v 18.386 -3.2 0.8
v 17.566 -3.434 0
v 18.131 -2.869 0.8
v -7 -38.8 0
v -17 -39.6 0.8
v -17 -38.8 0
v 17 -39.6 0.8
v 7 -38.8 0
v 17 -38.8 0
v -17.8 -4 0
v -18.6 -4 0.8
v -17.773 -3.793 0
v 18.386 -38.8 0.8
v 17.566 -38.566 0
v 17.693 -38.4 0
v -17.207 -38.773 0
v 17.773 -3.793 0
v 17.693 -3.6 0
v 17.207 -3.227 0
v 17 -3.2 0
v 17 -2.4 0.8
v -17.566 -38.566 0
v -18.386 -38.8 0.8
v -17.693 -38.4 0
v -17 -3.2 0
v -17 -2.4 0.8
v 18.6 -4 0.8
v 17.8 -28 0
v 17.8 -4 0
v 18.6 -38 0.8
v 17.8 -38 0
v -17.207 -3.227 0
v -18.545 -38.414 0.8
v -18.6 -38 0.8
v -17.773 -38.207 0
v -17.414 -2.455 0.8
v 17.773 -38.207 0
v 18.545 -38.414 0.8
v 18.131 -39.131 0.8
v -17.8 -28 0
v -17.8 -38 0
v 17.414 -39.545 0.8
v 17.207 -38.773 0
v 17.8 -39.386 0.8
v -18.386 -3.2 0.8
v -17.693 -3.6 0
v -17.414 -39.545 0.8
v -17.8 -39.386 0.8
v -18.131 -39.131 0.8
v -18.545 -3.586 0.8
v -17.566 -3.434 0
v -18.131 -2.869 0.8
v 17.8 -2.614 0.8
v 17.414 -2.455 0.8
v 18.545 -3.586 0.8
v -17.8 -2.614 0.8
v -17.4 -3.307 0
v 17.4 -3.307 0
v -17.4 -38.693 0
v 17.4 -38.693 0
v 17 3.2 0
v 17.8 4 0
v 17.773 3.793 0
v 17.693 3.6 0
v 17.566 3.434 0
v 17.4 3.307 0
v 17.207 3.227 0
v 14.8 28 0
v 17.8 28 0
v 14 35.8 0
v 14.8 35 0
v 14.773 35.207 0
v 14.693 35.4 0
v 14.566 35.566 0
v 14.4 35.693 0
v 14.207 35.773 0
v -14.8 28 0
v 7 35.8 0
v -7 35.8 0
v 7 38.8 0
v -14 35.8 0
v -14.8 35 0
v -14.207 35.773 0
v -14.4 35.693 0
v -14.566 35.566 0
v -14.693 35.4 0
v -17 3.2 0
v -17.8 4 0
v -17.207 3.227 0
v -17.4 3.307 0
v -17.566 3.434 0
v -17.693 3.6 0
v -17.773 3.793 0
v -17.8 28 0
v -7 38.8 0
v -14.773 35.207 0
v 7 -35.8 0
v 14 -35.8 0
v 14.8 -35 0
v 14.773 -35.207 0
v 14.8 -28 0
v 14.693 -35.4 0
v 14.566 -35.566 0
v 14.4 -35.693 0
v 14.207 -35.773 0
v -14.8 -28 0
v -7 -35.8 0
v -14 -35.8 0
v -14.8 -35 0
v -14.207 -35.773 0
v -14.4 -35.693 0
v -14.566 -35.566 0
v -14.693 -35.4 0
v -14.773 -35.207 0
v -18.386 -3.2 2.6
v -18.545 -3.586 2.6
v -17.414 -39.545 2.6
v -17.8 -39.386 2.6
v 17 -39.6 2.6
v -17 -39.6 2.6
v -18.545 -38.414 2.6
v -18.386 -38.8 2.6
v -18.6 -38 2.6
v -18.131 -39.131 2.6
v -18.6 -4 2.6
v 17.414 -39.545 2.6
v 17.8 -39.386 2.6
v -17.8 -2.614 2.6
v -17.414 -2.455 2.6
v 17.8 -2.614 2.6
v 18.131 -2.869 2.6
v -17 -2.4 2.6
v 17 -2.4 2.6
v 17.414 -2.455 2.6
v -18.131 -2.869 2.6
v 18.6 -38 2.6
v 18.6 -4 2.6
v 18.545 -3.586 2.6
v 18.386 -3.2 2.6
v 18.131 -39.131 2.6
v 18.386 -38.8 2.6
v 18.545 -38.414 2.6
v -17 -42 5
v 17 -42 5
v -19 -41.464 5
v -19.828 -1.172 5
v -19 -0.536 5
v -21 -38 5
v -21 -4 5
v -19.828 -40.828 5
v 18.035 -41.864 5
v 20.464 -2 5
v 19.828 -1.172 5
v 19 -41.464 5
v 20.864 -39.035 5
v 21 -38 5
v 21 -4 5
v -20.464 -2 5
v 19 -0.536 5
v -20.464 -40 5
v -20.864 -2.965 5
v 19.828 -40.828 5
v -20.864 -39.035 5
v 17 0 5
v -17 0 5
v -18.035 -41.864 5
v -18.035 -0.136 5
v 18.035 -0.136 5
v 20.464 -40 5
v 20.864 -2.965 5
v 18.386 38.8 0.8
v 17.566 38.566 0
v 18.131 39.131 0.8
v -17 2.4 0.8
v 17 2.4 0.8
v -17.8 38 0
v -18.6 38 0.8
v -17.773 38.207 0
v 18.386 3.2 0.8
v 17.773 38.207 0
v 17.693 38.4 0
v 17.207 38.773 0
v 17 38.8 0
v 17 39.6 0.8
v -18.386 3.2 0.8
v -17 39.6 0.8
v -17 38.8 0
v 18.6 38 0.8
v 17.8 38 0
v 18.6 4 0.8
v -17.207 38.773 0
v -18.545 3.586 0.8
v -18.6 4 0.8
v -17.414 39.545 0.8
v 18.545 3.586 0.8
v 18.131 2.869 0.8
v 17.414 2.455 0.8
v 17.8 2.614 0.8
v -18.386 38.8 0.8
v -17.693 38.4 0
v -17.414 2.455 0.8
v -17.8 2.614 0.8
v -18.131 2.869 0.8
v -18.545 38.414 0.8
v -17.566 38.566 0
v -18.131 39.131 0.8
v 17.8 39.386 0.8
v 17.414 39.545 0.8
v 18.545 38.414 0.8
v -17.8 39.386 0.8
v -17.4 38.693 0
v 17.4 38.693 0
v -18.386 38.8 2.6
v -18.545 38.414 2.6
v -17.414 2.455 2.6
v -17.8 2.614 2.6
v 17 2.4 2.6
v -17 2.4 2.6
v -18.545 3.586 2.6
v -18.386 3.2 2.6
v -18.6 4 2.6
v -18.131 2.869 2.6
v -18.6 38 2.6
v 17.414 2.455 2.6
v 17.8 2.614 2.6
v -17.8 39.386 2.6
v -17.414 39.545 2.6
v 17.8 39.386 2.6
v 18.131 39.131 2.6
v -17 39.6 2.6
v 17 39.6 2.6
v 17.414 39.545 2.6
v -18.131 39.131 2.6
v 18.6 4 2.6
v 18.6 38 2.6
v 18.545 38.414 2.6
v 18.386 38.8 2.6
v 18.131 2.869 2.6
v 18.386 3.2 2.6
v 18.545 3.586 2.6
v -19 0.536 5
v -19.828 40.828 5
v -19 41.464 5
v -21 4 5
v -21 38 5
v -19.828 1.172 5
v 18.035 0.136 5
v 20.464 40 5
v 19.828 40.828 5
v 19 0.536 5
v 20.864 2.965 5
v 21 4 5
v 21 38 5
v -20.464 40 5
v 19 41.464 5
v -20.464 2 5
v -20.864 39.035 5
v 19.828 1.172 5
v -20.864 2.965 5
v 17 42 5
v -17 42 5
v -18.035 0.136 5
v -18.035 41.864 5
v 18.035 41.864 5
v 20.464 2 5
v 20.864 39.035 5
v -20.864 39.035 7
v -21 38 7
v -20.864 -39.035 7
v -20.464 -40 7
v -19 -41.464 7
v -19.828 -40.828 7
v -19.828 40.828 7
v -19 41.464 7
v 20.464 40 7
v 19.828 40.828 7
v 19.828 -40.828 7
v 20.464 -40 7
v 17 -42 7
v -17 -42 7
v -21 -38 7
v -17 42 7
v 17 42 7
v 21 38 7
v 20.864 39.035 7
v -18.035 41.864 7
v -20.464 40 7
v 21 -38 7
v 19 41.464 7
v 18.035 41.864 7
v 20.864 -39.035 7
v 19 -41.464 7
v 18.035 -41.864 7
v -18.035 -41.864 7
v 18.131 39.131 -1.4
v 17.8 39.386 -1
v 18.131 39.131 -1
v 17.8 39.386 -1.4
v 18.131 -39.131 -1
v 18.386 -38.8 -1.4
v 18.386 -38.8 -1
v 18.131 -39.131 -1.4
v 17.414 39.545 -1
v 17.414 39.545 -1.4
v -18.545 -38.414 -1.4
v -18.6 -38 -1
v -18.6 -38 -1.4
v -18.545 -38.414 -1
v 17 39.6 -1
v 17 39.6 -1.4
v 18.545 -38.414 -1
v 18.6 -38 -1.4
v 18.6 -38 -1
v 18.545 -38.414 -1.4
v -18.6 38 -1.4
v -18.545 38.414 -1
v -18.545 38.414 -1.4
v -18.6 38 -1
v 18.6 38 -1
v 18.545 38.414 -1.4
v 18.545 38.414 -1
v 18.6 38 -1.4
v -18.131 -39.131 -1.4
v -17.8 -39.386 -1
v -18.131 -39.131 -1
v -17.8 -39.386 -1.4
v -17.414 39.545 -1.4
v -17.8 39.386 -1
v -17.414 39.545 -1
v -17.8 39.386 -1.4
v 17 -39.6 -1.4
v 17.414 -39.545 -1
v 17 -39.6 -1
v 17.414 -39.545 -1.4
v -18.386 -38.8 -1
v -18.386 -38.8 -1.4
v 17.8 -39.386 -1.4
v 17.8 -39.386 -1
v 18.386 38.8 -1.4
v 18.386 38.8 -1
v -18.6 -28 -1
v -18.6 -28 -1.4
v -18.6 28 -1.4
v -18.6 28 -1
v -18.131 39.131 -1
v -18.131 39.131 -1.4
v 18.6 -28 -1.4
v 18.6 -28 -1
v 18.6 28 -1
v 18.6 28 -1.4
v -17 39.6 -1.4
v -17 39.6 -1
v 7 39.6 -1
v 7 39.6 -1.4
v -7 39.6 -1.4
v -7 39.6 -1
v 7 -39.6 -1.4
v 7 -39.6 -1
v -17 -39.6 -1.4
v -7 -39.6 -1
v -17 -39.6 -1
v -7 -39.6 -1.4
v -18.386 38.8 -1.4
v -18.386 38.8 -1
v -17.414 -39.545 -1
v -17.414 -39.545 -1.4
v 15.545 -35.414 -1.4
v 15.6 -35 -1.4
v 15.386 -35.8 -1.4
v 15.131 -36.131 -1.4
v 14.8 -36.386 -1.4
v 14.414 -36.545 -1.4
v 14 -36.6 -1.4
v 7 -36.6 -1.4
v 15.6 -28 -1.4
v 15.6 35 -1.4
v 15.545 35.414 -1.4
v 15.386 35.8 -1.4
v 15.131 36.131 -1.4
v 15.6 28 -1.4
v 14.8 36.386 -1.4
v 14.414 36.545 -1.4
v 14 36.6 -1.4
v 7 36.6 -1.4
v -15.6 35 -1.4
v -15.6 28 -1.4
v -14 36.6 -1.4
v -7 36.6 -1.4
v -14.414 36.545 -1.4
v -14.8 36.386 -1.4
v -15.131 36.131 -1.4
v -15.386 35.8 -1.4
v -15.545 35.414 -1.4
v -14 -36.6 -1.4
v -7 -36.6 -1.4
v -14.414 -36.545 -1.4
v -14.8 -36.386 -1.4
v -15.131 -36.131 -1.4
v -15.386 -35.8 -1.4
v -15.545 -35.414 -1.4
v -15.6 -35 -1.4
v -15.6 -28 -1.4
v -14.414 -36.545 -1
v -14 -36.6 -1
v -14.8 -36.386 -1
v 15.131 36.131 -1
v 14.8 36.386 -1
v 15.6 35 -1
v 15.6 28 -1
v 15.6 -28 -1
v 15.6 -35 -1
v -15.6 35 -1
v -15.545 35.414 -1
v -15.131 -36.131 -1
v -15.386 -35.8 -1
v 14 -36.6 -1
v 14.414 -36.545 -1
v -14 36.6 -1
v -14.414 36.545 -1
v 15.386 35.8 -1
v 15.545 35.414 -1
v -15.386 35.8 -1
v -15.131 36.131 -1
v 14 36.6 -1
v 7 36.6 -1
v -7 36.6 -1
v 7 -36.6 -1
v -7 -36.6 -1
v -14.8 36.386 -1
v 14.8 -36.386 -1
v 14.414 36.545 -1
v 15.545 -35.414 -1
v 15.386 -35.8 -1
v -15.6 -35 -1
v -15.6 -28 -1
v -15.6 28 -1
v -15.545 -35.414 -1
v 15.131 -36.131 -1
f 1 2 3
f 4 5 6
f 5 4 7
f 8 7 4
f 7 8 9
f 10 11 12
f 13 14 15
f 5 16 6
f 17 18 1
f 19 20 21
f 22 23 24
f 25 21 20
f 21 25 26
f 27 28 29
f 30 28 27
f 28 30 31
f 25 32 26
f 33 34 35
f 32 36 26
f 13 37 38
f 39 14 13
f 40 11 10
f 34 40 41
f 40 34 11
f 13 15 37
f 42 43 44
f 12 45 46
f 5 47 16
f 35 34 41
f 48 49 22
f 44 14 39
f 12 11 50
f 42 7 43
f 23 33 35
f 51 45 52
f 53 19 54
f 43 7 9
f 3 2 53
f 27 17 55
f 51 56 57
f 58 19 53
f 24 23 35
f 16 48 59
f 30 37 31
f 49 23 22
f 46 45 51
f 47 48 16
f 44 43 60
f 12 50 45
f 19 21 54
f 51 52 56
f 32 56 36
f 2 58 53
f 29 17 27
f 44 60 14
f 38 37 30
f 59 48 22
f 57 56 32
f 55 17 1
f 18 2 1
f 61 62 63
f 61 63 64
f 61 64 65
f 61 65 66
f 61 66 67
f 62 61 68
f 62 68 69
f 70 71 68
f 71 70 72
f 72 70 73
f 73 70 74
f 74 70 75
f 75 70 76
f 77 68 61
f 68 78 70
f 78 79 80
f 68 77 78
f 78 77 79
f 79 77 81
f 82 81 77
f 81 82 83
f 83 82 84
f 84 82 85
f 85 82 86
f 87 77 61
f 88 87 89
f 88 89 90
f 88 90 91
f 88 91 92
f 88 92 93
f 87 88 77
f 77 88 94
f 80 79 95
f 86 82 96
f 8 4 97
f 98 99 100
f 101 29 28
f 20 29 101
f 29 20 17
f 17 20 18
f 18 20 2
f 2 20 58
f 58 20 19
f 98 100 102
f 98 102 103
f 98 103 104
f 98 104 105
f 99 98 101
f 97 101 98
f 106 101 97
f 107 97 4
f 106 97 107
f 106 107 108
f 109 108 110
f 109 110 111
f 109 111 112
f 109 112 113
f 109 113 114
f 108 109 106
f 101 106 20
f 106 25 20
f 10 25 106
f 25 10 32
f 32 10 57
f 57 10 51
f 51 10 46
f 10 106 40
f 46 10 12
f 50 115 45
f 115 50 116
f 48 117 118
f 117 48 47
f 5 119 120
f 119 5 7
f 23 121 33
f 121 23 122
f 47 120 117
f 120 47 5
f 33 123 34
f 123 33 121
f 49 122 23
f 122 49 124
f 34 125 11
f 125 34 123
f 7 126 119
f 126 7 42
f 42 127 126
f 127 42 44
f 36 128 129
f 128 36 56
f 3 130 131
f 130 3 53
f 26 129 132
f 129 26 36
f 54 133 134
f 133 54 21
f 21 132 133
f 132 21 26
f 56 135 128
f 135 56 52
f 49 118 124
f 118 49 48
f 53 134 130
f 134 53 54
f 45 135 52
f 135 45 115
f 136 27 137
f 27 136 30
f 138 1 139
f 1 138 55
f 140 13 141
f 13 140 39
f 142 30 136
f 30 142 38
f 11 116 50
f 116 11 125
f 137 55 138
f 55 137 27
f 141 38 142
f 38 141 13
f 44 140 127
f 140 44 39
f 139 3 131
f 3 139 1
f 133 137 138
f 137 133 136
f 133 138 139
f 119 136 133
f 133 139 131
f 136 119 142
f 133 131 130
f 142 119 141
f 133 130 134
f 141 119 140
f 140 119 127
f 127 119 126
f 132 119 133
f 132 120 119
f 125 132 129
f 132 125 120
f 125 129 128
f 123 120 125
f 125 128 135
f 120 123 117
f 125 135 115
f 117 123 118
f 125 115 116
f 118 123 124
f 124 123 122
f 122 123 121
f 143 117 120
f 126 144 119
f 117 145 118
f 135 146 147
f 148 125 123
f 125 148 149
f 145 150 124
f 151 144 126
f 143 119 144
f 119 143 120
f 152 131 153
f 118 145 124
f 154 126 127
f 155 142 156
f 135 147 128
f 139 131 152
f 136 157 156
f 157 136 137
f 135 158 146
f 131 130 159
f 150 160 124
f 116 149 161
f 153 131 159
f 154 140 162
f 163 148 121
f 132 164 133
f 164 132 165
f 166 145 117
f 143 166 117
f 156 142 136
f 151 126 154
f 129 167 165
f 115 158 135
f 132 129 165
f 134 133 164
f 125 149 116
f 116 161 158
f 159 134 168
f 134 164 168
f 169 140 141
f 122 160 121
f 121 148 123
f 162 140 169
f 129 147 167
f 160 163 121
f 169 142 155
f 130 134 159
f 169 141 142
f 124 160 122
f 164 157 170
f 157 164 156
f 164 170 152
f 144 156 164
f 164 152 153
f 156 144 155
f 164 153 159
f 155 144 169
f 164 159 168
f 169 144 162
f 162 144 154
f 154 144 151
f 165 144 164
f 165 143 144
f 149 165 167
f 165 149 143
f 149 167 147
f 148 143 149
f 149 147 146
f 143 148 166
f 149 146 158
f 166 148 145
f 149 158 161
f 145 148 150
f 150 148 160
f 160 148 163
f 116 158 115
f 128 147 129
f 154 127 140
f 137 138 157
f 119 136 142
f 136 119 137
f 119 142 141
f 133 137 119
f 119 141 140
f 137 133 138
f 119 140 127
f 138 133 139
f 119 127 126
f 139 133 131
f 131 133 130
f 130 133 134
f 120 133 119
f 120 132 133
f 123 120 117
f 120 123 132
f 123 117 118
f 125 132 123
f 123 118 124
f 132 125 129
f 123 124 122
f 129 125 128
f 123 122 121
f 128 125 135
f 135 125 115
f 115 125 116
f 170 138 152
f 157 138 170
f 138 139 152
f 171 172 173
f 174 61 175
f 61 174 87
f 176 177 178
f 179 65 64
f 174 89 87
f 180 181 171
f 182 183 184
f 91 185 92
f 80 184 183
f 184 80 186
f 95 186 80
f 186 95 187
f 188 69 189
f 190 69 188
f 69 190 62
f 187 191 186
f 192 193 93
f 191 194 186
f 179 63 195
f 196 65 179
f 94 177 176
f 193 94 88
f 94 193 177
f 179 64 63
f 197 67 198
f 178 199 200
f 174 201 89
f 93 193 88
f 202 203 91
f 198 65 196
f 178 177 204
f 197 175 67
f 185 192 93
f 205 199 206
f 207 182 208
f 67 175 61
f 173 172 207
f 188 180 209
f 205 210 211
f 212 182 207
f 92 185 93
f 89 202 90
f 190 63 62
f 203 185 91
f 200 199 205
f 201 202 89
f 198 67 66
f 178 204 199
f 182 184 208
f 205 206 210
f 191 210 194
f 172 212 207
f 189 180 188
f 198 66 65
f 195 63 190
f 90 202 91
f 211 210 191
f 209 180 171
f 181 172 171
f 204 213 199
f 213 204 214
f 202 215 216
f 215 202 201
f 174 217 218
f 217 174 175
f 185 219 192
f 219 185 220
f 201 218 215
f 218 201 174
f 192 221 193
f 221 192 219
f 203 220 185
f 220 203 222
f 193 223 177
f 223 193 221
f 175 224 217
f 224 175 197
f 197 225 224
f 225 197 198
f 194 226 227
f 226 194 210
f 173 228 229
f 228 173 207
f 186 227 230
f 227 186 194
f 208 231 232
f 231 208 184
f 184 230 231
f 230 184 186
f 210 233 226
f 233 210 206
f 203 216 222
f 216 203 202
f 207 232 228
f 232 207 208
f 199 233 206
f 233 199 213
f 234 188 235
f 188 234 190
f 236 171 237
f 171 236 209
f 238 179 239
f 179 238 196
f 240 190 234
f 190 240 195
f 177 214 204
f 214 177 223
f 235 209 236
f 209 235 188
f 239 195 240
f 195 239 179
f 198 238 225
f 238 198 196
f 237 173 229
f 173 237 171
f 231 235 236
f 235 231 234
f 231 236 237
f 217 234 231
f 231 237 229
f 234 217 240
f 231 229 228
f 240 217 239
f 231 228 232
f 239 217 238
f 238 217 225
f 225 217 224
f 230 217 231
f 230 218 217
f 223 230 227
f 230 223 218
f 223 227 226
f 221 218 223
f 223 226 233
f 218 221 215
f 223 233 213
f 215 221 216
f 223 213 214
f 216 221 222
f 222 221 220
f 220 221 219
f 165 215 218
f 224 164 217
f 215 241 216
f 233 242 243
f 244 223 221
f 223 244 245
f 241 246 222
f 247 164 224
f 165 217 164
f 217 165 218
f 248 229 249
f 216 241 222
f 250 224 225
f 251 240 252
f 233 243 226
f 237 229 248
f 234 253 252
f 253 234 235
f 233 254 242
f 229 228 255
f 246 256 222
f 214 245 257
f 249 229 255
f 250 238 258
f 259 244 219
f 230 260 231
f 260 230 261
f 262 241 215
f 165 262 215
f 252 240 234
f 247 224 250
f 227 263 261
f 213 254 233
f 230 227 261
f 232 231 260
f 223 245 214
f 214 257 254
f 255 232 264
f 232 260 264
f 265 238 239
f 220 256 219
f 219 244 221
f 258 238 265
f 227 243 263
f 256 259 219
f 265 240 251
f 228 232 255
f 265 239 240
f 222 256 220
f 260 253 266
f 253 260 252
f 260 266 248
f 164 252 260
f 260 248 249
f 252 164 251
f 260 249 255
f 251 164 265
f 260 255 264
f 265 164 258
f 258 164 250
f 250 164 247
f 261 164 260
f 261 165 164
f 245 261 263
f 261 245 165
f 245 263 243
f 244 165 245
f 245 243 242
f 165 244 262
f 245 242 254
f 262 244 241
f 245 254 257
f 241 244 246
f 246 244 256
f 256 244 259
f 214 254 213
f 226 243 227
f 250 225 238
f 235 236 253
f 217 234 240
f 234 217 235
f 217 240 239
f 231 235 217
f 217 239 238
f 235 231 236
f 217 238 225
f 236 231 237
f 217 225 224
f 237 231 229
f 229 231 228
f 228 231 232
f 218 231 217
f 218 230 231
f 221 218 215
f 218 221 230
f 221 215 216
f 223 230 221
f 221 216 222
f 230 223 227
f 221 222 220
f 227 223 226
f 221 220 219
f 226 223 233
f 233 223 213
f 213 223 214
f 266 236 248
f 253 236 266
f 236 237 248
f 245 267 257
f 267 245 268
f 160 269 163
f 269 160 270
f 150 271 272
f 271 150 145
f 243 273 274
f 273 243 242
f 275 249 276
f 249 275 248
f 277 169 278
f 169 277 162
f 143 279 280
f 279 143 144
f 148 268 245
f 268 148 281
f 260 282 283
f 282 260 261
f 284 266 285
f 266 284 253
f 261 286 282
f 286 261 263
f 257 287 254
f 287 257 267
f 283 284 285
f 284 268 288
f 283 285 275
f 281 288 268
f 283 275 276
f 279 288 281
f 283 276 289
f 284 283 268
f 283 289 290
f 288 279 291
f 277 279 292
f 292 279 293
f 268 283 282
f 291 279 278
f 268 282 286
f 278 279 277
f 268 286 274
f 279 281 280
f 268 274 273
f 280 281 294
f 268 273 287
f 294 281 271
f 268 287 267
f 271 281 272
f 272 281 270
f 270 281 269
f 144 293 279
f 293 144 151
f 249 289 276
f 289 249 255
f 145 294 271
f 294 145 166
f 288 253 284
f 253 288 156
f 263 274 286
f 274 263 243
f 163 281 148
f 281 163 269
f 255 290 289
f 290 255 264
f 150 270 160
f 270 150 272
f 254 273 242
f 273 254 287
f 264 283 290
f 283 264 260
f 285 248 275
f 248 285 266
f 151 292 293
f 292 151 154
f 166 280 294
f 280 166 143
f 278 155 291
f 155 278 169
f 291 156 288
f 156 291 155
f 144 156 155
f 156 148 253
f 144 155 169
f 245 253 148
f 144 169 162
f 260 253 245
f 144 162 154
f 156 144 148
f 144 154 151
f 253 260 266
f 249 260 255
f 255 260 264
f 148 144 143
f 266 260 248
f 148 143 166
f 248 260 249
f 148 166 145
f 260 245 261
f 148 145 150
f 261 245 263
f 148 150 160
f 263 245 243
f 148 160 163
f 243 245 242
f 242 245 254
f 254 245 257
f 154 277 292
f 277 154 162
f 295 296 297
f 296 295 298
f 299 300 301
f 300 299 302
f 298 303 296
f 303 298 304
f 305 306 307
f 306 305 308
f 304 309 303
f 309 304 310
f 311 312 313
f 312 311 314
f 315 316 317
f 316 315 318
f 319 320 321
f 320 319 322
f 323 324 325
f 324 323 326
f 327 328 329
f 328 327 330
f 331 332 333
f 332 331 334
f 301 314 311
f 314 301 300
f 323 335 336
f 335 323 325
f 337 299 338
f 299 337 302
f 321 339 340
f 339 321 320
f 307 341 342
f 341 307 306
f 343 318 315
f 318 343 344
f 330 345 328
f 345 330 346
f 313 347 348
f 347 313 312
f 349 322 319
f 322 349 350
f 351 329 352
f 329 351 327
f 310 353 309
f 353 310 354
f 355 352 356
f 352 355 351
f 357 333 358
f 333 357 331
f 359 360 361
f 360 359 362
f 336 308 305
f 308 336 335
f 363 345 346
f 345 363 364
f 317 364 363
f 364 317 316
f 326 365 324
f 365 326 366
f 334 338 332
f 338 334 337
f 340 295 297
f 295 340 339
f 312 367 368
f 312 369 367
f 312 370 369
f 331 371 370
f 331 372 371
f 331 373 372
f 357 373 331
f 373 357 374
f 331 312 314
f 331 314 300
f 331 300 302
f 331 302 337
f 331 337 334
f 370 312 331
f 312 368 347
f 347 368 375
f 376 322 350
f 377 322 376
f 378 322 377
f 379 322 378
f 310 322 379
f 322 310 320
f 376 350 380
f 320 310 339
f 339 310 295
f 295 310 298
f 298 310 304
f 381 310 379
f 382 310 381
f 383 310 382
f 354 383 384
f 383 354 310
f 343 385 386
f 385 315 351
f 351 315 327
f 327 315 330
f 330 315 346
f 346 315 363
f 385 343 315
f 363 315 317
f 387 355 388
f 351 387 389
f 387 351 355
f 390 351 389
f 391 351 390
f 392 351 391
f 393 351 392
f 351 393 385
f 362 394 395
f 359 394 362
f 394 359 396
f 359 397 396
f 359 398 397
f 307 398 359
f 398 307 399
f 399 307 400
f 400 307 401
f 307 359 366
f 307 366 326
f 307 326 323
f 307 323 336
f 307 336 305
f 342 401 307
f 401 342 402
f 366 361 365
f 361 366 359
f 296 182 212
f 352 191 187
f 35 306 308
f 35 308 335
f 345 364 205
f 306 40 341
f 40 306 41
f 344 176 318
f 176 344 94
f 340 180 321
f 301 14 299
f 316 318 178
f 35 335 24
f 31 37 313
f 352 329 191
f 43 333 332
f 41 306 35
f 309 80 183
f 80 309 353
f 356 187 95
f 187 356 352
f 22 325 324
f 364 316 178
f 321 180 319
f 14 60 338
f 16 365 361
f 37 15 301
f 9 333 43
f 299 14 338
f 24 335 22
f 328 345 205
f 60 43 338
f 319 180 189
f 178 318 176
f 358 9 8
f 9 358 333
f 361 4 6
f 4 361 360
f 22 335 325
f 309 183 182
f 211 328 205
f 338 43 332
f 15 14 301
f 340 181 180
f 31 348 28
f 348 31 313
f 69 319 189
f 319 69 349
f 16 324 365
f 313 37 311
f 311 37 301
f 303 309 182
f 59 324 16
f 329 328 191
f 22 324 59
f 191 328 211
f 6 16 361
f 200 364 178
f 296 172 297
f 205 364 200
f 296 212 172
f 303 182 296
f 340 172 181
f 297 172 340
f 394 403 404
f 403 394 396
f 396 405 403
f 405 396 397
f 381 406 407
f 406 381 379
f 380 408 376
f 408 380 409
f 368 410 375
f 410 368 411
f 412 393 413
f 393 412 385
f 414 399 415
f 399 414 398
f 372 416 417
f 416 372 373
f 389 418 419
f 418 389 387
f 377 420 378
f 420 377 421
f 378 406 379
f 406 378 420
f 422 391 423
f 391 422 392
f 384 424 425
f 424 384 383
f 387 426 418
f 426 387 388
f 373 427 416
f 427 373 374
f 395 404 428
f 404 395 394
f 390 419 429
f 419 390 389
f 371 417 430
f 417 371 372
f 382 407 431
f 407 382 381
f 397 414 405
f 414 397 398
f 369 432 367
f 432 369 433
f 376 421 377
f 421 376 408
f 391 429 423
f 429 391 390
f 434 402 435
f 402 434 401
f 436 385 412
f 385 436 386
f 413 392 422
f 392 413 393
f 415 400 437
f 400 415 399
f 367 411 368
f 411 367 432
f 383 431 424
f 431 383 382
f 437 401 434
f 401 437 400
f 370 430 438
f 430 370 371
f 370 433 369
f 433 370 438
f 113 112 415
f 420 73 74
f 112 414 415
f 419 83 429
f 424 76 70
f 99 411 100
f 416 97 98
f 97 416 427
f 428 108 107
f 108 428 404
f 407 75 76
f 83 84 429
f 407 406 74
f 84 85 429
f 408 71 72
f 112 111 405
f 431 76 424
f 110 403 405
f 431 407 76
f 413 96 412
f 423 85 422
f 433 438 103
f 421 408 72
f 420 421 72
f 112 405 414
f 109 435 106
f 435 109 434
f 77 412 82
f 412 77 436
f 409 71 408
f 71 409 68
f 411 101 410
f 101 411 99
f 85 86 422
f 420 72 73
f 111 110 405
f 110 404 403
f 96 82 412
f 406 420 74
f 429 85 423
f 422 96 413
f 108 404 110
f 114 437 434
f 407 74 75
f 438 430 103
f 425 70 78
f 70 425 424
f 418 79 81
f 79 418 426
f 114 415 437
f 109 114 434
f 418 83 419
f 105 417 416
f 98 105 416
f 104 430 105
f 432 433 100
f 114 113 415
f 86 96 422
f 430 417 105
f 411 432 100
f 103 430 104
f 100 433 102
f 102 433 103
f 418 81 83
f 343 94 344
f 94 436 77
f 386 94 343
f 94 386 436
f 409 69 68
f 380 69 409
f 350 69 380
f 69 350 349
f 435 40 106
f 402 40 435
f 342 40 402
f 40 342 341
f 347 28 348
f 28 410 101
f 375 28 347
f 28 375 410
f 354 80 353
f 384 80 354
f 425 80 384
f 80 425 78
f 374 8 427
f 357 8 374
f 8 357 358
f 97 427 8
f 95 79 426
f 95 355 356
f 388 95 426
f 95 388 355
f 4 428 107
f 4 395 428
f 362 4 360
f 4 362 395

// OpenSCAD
// file: gridfinity_core.scad
gridfinity_scale = [42, 42];
gridfnity_z_height = 7;
gridfinity_pad_height = 5;
gridfinity_corner_radius = 8;

bottom_corner_radius_ratio = 0.2;
mid_corner_radius_ratio = 0.4;

// Examples
// standard_plate([3, 5], 2);

// ---Standard Definitions
// These define standard sized gridfinity modules.

module standard_block(count) {
    standard_plate([count.x, count.y], count.z * gridfnity_z_height);
}

module standard_plate(count, z_height) {
    with_scaleable_pad(count, gridfinity_scale, gridfinity_pad_height, gridfinity_corner_radius)
    single_box_segment(
        [
            count.x * gridfinity_scale.x/2 - gridfinity_corner_radius/2, 
            count.y * gridfinity_scale.y/2 - gridfinity_corner_radius/2,
        ],
        [0, z_height],
        [gridfinity_corner_radius,gridfinity_corner_radius]
    );
}

module standard_pad() {
    scaleable_pad(gridfinity_scale, gridfnity_z_height, gridfinity_corner_radius);
}

module standard_grid_layout(count) {
    scaleable_grid_layout(count, gridfinity_scale) children();
}

// ---Scalable Definition
// These define entirely custom scalable modules that make use of no globals.

module with_scaleable_pad(count, scale, pad_height, radius) {
    union() {
        translate([0,0, pad_height]) children();
        
        scaleable_grid_layout(count, scale)
        scaleable_pad(scale, pad_height, radius);
    };
}

// creates a scalable gridfinity pad
module scaleable_pad(scale, z_height, radius, extra_height=0, extra_radius=0){
    // a list of tuples of (heigh, corner_radius) that defines breakpoints across a gridfinity pad.
    edge_definition = [
        [0, bottom_corner_radius_ratio * radius],
        [0.16 * z_height, mid_corner_radius_ratio * radius],
        [0.52 * z_height, mid_corner_radius_ratio * radius],
        [1 * z_height, radius],
    ];
    
    // Our intended ending xy size is exactly scale so we need to reduce the offset by the max corner_radius in our edge_definition.
    edge_radius_inset = max([ for (edge = edge_definition) edge[1] ])/2;
        
    // Add in extra radius to breakpoints.
    edge_definition_radius = [ for (edge = edge_definition) [edge[0], edge[1] + extra_radius ]];
    
    pad_offset = [scale.x/2 - edge_radius_inset, scale.y/2 - edge_radius_inset];
    if ( extra_height > 0 ) {
        // Add new breakpoints before and after if height is extra.
        start_breakpoint = edge_definition_radius[0];
        end_breakpoint =  edge_definition_radius[len(edge_definition_radius)-1];
        single_pad(
            pad_offset = pad_offset,
            edge_definition = concat(
                [[start_breakpoint[0]-extra_height, start_breakpoint[1]]],
                edge_definition_radius,
                [[end_breakpoint[0]+extra_height, end_breakpoint[1]]]
            )
        );
    } else {
        single_box(
            pad_offset = pad_offset,
            edge_definition = edge_definition_radius
        );
    }
}

// ---Generic Modules
// Generically useful modules

// creates multi layer box segment.
module single_box(pad_offset, edge_definition) {
    // We will tansform these 2d breakpoints to a 3d pad by iterating over them and generating
    // segments that would connect each breakpoint to the next.
    union(){
        if (len(edge_definition) > 1) {
            for (i = [0:len(edge_definition)-2]) {
                single_box_segment(
                    offset=pad_offset,
                    height=[edge_definition[i][0],edge_definition[i+1][0]],
                    corner_radius=[edge_definition[i][1],edge_definition[i+1][1]]
                );
            }
        }
    }
}

// creates a single rounded corner box segment.
module single_box_segment(offset, height, corner_radius, segments=24){
    translate([0,0,height[0]]) hull() 2d_cornercopy(offset) {        
        cylinder(d1=corner_radius[0], d2=corner_radius[1], h=height[1]-height[0], $fn=segments);
    }
}

// copies children to all 4 possible corner variations of the offset.
module 2d_cornercopy(offset) {
  for (xx=[-offset.x, offset.x]) for (yy=[-offset.y, offset.y]) 
    translate([xx, yy, 0]) children();
}

module scaleable_grid_layout(count, scale) {
  translate([-(count.x-1) / 2 * scale.x, -(count.y-1) / 2 * scale.y, 0])
  for (xx=[0:scale.x:(count.x-1) * scale.x]) for (yy=[0:scale.x:(count.y-1) * scale.x]) 
    translate([xx, yy, 0]) children();
}
// main file
include <gridfinity_core.scad>

gridfinity_indent = [gridfinity_corner_radius, gridfinity_corner_radius];
magnet_color = "#023047";
snap_color = "#219ebc";

// Examples
// with_standard_magnets([1, 2]) standard_plate([1, 2], 2);
with_standard_snap_fit([1, 2]) standard_plate([1, 2], 2);

// ---Standard Definitions
// These define standard sized gridfinity modules.

module with_push_fit_magnets(count) {
    with_scaleable_magnets(
        count, gridfinity_scale, gridfinity_indent,
        magnet_diameter=6.2, magnet_depth=2.2
    ) children();
}

module with_standard_magnets(count) {
    with_scaleable_magnets(
        count, gridfinity_scale, gridfinity_indent,
        magnet_diameter=6.5, magnet_depth=2.4
    ) children();
}

module with_standard_snap_fit(count) {
    with_scaleable_snap_fit(
        count, gridfinity_scale, gridfinity_indent,
        [
            gridfinity_corner_radius * bottom_corner_radius_ratio, 
            gridfinity_corner_radius * mid_corner_radius_ratio
        ], 1.4, 10, 3
    ) children();
}

// ---Scalable Definition
// These define entirely custom scalable modules that make use of no globals.

module with_scaleable_snap_fit(
    count, scale, indent, radius, depth, size, width
) {
    true_scale = ([scale.x * count.x, scale.y * count.y] - indent);
    max_radius = max(radius);
    union() {
        children();
        
        color(snap_color)
        render() union() {
            difference() {
                single_box(
                    true_scale/2,
                    [
                        [-depth, radius[1]],
                        [-1, radius[1]],
                        [0,  radius[0]]
                    ]
                );
                single_box(
                    true_scale/2 - [width, width],
                    [
                        [-depth-1, radius[1]],
                        [-1, radius[1]],
                        [0,  radius[0]]
                    ]
                );
                translate([0,0,-depth]) cube([true_scale.x+max_radius+1, true_scale.y-size*2, depth*2], center = true);
                translate([0,0,-depth]) cube([true_scale.x-size*2, true_scale.y+max_radius+1, depth*2], center = true);
            }
        }
    }
}

module with_scaleable_magnets(
    count, scale, min_indent, 
    magnet_diameter, magnet_depth, extra_depth=0.1,
    segments=24
) {
    true_indent = [
        min((scale.x/2)-min_indent.x, scale.x/2 - 4 - magnet_diameter/2),
        min((scale.y/2)-min_indent.y, scale.y/2 - 4 - magnet_diameter/2)
    ];
    
    difference() {
        children();
        
        color(magnet_color) scaleable_grid_layout(count, scale)
        2d_cornercopy([true_indent.x, true_indent.y])
        translate([0,0,-extra_depth]) 
        cylinder(h=magnet_depth+extra_depth, d=magnet_diameter, $fn=segments);
    }
}
